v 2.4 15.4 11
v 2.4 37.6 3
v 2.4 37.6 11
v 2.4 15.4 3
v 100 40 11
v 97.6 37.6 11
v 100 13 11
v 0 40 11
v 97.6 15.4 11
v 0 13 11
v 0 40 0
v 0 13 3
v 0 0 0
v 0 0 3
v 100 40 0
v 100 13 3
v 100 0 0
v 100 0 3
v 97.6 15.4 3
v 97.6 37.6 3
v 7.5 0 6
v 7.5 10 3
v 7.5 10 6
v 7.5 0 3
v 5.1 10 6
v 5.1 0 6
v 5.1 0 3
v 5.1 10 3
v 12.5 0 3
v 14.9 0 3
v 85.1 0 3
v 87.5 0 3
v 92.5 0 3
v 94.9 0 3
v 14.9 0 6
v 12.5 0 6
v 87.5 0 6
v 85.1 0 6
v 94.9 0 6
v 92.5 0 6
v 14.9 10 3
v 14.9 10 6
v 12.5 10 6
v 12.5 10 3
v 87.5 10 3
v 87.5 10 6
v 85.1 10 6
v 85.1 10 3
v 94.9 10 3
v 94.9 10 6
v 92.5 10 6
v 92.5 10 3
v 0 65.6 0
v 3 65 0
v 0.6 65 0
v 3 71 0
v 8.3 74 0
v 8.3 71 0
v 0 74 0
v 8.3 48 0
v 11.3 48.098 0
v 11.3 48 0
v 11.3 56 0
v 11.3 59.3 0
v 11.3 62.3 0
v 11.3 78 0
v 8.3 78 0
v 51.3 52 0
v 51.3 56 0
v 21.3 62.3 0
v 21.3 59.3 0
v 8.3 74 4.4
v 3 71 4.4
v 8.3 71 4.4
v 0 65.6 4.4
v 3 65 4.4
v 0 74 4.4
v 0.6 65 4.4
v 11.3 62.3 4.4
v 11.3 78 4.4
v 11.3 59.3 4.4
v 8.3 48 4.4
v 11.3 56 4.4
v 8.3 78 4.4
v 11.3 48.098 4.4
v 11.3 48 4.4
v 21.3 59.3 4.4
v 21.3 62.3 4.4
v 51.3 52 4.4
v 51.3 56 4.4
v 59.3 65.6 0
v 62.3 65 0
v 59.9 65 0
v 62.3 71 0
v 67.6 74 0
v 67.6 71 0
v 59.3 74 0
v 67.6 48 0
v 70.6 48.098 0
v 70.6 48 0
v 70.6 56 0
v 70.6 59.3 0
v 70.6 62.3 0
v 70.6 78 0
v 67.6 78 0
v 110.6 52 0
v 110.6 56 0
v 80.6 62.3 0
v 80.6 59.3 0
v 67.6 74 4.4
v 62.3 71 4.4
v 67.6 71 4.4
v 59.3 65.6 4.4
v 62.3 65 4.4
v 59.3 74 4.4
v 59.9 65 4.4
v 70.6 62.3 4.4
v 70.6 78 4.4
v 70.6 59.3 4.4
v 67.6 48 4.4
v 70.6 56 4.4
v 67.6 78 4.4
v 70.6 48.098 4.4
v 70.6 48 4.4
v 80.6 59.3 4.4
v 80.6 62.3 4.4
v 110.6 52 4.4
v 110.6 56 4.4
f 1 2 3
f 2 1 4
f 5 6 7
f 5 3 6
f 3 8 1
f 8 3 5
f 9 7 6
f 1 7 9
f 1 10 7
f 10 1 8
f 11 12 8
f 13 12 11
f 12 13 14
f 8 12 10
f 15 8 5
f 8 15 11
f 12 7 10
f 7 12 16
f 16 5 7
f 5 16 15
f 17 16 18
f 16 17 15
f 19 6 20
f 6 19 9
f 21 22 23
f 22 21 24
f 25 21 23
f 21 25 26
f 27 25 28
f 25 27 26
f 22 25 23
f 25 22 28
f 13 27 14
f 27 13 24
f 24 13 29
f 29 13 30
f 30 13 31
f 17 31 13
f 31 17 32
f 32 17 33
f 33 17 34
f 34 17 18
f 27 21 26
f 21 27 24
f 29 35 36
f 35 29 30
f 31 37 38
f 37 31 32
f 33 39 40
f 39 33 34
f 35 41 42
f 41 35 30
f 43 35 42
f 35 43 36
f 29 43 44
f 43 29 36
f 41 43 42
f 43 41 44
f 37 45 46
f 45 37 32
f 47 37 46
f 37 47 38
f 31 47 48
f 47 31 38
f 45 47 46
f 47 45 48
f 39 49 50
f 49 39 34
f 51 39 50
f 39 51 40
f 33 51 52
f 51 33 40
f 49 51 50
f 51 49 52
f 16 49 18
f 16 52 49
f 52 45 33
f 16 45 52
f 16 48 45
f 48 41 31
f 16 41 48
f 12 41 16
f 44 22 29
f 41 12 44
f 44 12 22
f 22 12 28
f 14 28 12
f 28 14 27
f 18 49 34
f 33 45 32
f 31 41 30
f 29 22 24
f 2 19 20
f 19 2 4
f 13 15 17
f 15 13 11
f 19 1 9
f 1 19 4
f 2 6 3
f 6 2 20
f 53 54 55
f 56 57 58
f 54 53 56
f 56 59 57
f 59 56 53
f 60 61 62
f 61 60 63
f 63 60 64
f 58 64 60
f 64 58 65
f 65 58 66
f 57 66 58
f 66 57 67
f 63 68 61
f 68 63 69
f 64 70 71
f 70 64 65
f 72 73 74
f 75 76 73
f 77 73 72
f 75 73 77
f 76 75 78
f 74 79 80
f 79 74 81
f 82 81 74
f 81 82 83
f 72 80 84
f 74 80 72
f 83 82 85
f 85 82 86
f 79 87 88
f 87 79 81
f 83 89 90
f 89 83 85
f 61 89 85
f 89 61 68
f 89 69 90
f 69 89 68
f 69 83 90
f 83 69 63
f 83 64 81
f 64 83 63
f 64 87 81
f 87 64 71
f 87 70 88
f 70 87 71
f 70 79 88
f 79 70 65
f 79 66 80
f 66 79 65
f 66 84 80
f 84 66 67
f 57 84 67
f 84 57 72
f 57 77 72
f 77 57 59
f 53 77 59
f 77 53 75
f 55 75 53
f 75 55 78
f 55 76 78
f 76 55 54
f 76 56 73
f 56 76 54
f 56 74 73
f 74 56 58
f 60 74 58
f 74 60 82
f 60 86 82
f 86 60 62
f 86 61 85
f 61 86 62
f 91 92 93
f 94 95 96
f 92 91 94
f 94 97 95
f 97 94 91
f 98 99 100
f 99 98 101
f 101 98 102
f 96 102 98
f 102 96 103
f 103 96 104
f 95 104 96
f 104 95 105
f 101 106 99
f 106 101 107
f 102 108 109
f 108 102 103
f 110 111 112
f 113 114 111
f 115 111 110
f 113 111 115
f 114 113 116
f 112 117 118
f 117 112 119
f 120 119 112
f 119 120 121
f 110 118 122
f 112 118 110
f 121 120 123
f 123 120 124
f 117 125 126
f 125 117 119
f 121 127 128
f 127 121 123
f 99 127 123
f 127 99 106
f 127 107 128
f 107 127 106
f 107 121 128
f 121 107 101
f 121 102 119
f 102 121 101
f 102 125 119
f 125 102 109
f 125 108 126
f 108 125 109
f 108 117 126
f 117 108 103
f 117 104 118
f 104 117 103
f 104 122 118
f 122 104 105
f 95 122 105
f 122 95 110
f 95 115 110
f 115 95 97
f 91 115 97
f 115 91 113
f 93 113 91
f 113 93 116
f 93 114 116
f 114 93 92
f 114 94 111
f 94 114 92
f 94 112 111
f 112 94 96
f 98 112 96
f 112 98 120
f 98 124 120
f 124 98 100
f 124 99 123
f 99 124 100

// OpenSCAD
// SKADIS small tray with removable, flat-printed hook brackets.
// Print all three pieces as laid out: body base down, brackets on broad sides.
// No supports, glue or hardware. Use 4 perimeters; PETG or PLA.
// Mount both brackets in same-height slots: insert teeth, then lower until
// the necks seat. Slide the body's rear apron under the upper fingers,
// between the guide ribs, until its rear edge meets the vertical spines.
// The ledges carry the load; slide the body forward to remove it.
// This is a gravity mount, not a locking latch. Use for light items.
// Dimensions: nominal 5 x 15 mm obround slots, 5 mm board thickness.
// Adjacent columns: 20 mm; alternate columns offset vertically by 20 mm.
// Same-height slots and same-column slots repeat every 40 mm.
// Measurement references (geometry below is original, not copied):
// https://www.reddit.com/r/ikeahacks/comments/rk2qk0/
// https://www.printables.com/model/109009-ikea-skadis-hook-hacek-10mm-100mm
// https://github.com/sebasdv/skadisgen (staggered grid only).
// Print the small hook first to tune fit; physical fit/load not yet tested.

mount_steps = 2; // Hook spacing in 40 mm same-height grid steps [1:1:3]
depth = 40; // Tray depth including rear assembly apron, mm [30:1:55]
rim_height = 8; // Rim height above tray floor, mm [4:1:14]
wall = 2.4; // Rim and guide rib thickness, mm [1.6:0.2:3.2]
floor_thickness = 3; // Tray floor thickness, mm [2.4:0.2:4]
board_thickness = 5; // Measured board thickness, mm [4.6:0.1:5.4]
tolerance = 0.3; // Clearance per slot side and behind board, mm [0.2:0.05:0.4]
joint_clearance = 0.3; // Sliding joint clearance, mm [0.2:0.05:0.4]
assembled = 0; // View mode: 0 print layout, 1 mounted assembly [0:1:1]

slot_width = 5; // Nominal slot width, mm
clip_width = slot_width-2*tolerance; // Blade thickness across slot, mm
board_gap = board_thickness+tolerance; // Clearance behind front bearing face, mm

width = 40*mount_steps+20; // Tray width, with 10 mm hook margins, mm
apron_depth = 13; // Rear joint area, outside the tray pocket, mm

// Shared SKADIS profile, in [depth from board, height] coordinates.
// Front bearing face is depth 0; board occupies depth -board_thickness..0.
// A 3 mm neck at height 23..26 passes through the slot; the rear tooth
// reaches height 17, extending 6 mm below the neck to catch behind the board.
// Centre the 9 mm tall tooth in the slot's 10 mm straight middle to insert.
// At default tolerance its 4.4 mm width leaves 0.3 mm on each slot side;
// board_gap leaves another 0.3 mm behind the board before pulling forward.
// Lower until the neck corners bear on the rounded slot bottom (contact is
// intentional). Lift about 8 mm at default fit to centre the tooth for removal.
// Verified against a separate 5 x 15 mm obround-slot board via the dev API;
// Insertion/lowering clear; withdrawal catches. See docs/example-feedback/skadis.md.
module skadis_clip_outline() {
    polygon([[0,0],[3,0],[3,30],[0,30],[0,26],
             [-board_gap-3,26],[-board_gap-3,17.6],
             [-board_gap-2.4,17],[-board_gap,17],
             [-board_gap,23],[0,23]]);
}

module body() {
    union() {
        cube([width,depth,floor_thickness]);
        // Three outside rims and a back rim leave the mounting apron clear.
        translate([0,apron_depth,floor_thickness-0.1])
            cube([width,wall,rim_height+0.1]);
        translate([0,depth-wall,floor_thickness-0.1])
            cube([width,wall,rim_height+0.1]);
        for (x=[0,width-wall])
            translate([x,apron_depth,floor_thickness-0.1])
                cube([wall,depth-apron_depth,rim_height+0.1]);
        apron_guides();
    }
}

// Flat side plate: lower ledge supports the body; upper finger captures
// its rear apron. All intersections overlap, rather than just touching.
module support_bracket() {
    linear_extrude(clip_width)
        union() {
            skadis_clip_outline();
            polygon([[2,0],[depth+3,4],[depth+3,8],[2,8]]);
            translate([2,8+floor_thickness+joint_clearance])
                square([11,3]);
        }
}

// Guide ribs capture the upper fingers sideways, leaving the front open
// for removal. The body slides toward the board until it meets the spines.
module apron_guides() {
    for (x=[10,width-10])
        for (side=[-1,1])
            translate([x+side*(clip_width/2+joint_clearance+wall/2)-wall/2,
                       0,floor_thickness-0.1])
                cube([wall,10,3.1]);
}

module brackets() {
    if (assembled == 1) {
        for (x=[10,width-10])
            translate([x-clip_width/2,0,0])
                rotate([90,0,90]) support_bracket();
    } else {
        for (i=[0:1])
            translate([board_gap+3+i*(depth+board_gap+14),depth+8,0])
                support_bracket();
    }
}

// Body and brackets print together, each in its own preview colour.
module layout() {
    color("#89c454") translate(assembled == 1 ? [0,3,8] : [0,0,0]) body();
    color("#d9dde2") brackets();
}

layout();
